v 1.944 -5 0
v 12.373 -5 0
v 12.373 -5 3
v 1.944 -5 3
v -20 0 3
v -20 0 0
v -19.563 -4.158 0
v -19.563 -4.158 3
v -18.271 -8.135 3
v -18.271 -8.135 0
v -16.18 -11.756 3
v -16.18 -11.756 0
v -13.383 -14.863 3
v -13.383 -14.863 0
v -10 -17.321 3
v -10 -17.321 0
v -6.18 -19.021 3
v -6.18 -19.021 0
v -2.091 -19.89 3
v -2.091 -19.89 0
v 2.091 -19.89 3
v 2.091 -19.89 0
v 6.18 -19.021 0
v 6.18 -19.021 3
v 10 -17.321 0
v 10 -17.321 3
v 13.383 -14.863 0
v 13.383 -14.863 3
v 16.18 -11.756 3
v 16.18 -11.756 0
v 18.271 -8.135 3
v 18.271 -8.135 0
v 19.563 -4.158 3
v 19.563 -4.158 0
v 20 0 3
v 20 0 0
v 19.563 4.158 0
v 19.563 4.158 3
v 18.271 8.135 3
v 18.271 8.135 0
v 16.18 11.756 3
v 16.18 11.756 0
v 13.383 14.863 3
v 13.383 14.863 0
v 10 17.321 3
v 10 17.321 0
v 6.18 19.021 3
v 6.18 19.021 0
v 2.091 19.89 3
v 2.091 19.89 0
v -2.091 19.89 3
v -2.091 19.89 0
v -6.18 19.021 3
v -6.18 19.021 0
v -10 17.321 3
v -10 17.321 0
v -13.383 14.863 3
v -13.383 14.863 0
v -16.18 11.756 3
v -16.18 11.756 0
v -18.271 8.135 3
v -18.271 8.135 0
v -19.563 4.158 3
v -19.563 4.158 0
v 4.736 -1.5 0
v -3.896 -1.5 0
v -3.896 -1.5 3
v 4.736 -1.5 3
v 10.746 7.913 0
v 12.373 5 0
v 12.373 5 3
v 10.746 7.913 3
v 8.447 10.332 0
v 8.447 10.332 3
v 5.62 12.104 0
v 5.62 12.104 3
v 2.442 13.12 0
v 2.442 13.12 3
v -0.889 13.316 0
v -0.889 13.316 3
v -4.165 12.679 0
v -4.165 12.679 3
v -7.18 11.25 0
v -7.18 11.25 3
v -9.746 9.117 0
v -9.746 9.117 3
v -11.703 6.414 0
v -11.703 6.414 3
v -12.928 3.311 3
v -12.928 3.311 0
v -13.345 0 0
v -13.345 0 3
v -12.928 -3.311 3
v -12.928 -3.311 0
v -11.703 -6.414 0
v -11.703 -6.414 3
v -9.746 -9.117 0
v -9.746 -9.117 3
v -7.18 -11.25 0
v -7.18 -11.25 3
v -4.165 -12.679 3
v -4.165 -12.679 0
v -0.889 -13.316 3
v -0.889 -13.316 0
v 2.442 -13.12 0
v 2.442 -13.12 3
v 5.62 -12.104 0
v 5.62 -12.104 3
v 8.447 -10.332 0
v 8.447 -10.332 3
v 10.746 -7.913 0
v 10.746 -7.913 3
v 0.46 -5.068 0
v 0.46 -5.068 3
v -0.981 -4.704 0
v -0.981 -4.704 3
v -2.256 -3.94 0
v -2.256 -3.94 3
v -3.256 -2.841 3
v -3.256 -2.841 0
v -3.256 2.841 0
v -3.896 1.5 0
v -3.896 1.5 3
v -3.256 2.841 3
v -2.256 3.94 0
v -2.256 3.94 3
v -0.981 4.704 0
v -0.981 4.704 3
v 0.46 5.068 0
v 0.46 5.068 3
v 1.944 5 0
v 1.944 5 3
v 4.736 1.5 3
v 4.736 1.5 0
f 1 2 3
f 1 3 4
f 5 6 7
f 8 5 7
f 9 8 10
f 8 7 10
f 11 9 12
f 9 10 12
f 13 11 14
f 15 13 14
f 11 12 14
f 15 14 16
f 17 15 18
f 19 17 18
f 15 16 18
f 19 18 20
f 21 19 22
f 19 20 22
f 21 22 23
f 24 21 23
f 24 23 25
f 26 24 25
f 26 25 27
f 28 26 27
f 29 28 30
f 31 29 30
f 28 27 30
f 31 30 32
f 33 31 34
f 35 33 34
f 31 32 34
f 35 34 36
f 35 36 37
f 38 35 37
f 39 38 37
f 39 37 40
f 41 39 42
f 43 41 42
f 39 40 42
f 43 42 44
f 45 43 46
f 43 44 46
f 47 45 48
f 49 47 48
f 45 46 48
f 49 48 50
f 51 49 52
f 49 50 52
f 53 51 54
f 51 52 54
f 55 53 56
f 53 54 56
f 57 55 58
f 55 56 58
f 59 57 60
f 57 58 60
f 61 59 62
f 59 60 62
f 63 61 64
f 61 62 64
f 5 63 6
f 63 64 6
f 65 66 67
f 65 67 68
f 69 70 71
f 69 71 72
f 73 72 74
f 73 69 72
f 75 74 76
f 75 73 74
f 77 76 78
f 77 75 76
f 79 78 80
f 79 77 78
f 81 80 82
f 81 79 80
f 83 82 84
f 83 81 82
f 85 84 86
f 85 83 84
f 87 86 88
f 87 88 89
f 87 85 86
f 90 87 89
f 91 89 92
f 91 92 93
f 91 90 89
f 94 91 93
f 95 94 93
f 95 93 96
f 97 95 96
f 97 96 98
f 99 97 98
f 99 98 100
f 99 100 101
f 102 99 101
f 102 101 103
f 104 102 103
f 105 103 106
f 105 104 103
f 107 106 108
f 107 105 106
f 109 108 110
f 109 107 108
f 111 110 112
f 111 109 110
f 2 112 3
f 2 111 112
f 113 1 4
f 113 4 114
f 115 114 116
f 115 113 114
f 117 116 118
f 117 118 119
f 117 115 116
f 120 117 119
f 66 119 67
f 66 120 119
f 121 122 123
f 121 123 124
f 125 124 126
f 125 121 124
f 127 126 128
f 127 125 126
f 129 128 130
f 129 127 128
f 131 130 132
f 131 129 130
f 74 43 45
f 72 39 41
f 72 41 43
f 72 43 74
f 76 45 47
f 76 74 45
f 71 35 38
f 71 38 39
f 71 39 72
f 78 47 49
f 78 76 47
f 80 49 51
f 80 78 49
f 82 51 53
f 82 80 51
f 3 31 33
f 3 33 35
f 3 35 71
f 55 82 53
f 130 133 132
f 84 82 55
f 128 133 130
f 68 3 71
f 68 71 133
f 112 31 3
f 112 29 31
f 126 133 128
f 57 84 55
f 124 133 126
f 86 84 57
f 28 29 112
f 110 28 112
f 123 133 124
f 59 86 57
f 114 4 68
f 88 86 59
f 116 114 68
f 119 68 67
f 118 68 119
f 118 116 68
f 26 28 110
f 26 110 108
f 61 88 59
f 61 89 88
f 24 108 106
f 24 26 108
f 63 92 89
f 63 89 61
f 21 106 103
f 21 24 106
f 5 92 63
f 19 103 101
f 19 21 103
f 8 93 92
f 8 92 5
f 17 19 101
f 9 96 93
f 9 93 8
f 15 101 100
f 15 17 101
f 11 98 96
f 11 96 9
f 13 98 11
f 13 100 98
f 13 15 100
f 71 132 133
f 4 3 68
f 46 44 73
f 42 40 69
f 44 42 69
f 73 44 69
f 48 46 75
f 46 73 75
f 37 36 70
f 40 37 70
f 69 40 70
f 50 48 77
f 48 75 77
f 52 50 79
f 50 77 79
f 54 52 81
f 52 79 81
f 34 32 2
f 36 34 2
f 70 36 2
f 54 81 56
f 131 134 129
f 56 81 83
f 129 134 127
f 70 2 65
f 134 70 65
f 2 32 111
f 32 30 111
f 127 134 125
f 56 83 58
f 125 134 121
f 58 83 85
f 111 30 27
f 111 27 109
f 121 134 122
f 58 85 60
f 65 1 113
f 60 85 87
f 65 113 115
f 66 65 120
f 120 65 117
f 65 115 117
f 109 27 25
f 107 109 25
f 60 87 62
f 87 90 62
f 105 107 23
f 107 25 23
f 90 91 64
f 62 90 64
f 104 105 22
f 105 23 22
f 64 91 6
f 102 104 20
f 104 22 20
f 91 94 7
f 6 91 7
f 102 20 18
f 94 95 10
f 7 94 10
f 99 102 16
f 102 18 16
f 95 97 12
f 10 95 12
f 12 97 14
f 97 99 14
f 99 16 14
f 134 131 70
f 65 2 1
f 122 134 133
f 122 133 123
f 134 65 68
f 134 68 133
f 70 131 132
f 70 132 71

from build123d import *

# Parameters (mm, degrees)
SKETCH1_R          = 20
BASE_EXTRUDE_DEPTH = 3


with BuildPart() as part:
    # Sketch1 → Base-Extrude (new body)
    with BuildSketch(Plane.XY):
        with Locations(Location((0, 0, 0), (0, 0, 180))):
            Circle(SKETCH1_R)
        with BuildLine():
            Line((1.944214305, 5), (12.373449734, 5))
            ThreePointArc((12.373449734, 5), (-13.345495806, 0), (12.373449734, -5))
            Line((12.373449734, -5), (1.944214305, -5))
            ThreePointArc((1.944214305, -5), (-1.64638645, -4.369036915), (-3.895643079, -1.5))
            Line((-3.895643079, -1.5), (4.736201703, -1.5))
            Line((4.736201703, -1.5), (4.736201703, 1.5))
            Line((4.736201703, 1.5), (-3.895643079, 1.5))
            ThreePointArc((-3.895643079, 1.5), (-1.64638645, 4.369036915), (1.944214305, 5))
        make_face(mode=Mode.SUBTRACT)
    extrude(amount=BASE_EXTRUDE_DEPTH)


solid = part.part
